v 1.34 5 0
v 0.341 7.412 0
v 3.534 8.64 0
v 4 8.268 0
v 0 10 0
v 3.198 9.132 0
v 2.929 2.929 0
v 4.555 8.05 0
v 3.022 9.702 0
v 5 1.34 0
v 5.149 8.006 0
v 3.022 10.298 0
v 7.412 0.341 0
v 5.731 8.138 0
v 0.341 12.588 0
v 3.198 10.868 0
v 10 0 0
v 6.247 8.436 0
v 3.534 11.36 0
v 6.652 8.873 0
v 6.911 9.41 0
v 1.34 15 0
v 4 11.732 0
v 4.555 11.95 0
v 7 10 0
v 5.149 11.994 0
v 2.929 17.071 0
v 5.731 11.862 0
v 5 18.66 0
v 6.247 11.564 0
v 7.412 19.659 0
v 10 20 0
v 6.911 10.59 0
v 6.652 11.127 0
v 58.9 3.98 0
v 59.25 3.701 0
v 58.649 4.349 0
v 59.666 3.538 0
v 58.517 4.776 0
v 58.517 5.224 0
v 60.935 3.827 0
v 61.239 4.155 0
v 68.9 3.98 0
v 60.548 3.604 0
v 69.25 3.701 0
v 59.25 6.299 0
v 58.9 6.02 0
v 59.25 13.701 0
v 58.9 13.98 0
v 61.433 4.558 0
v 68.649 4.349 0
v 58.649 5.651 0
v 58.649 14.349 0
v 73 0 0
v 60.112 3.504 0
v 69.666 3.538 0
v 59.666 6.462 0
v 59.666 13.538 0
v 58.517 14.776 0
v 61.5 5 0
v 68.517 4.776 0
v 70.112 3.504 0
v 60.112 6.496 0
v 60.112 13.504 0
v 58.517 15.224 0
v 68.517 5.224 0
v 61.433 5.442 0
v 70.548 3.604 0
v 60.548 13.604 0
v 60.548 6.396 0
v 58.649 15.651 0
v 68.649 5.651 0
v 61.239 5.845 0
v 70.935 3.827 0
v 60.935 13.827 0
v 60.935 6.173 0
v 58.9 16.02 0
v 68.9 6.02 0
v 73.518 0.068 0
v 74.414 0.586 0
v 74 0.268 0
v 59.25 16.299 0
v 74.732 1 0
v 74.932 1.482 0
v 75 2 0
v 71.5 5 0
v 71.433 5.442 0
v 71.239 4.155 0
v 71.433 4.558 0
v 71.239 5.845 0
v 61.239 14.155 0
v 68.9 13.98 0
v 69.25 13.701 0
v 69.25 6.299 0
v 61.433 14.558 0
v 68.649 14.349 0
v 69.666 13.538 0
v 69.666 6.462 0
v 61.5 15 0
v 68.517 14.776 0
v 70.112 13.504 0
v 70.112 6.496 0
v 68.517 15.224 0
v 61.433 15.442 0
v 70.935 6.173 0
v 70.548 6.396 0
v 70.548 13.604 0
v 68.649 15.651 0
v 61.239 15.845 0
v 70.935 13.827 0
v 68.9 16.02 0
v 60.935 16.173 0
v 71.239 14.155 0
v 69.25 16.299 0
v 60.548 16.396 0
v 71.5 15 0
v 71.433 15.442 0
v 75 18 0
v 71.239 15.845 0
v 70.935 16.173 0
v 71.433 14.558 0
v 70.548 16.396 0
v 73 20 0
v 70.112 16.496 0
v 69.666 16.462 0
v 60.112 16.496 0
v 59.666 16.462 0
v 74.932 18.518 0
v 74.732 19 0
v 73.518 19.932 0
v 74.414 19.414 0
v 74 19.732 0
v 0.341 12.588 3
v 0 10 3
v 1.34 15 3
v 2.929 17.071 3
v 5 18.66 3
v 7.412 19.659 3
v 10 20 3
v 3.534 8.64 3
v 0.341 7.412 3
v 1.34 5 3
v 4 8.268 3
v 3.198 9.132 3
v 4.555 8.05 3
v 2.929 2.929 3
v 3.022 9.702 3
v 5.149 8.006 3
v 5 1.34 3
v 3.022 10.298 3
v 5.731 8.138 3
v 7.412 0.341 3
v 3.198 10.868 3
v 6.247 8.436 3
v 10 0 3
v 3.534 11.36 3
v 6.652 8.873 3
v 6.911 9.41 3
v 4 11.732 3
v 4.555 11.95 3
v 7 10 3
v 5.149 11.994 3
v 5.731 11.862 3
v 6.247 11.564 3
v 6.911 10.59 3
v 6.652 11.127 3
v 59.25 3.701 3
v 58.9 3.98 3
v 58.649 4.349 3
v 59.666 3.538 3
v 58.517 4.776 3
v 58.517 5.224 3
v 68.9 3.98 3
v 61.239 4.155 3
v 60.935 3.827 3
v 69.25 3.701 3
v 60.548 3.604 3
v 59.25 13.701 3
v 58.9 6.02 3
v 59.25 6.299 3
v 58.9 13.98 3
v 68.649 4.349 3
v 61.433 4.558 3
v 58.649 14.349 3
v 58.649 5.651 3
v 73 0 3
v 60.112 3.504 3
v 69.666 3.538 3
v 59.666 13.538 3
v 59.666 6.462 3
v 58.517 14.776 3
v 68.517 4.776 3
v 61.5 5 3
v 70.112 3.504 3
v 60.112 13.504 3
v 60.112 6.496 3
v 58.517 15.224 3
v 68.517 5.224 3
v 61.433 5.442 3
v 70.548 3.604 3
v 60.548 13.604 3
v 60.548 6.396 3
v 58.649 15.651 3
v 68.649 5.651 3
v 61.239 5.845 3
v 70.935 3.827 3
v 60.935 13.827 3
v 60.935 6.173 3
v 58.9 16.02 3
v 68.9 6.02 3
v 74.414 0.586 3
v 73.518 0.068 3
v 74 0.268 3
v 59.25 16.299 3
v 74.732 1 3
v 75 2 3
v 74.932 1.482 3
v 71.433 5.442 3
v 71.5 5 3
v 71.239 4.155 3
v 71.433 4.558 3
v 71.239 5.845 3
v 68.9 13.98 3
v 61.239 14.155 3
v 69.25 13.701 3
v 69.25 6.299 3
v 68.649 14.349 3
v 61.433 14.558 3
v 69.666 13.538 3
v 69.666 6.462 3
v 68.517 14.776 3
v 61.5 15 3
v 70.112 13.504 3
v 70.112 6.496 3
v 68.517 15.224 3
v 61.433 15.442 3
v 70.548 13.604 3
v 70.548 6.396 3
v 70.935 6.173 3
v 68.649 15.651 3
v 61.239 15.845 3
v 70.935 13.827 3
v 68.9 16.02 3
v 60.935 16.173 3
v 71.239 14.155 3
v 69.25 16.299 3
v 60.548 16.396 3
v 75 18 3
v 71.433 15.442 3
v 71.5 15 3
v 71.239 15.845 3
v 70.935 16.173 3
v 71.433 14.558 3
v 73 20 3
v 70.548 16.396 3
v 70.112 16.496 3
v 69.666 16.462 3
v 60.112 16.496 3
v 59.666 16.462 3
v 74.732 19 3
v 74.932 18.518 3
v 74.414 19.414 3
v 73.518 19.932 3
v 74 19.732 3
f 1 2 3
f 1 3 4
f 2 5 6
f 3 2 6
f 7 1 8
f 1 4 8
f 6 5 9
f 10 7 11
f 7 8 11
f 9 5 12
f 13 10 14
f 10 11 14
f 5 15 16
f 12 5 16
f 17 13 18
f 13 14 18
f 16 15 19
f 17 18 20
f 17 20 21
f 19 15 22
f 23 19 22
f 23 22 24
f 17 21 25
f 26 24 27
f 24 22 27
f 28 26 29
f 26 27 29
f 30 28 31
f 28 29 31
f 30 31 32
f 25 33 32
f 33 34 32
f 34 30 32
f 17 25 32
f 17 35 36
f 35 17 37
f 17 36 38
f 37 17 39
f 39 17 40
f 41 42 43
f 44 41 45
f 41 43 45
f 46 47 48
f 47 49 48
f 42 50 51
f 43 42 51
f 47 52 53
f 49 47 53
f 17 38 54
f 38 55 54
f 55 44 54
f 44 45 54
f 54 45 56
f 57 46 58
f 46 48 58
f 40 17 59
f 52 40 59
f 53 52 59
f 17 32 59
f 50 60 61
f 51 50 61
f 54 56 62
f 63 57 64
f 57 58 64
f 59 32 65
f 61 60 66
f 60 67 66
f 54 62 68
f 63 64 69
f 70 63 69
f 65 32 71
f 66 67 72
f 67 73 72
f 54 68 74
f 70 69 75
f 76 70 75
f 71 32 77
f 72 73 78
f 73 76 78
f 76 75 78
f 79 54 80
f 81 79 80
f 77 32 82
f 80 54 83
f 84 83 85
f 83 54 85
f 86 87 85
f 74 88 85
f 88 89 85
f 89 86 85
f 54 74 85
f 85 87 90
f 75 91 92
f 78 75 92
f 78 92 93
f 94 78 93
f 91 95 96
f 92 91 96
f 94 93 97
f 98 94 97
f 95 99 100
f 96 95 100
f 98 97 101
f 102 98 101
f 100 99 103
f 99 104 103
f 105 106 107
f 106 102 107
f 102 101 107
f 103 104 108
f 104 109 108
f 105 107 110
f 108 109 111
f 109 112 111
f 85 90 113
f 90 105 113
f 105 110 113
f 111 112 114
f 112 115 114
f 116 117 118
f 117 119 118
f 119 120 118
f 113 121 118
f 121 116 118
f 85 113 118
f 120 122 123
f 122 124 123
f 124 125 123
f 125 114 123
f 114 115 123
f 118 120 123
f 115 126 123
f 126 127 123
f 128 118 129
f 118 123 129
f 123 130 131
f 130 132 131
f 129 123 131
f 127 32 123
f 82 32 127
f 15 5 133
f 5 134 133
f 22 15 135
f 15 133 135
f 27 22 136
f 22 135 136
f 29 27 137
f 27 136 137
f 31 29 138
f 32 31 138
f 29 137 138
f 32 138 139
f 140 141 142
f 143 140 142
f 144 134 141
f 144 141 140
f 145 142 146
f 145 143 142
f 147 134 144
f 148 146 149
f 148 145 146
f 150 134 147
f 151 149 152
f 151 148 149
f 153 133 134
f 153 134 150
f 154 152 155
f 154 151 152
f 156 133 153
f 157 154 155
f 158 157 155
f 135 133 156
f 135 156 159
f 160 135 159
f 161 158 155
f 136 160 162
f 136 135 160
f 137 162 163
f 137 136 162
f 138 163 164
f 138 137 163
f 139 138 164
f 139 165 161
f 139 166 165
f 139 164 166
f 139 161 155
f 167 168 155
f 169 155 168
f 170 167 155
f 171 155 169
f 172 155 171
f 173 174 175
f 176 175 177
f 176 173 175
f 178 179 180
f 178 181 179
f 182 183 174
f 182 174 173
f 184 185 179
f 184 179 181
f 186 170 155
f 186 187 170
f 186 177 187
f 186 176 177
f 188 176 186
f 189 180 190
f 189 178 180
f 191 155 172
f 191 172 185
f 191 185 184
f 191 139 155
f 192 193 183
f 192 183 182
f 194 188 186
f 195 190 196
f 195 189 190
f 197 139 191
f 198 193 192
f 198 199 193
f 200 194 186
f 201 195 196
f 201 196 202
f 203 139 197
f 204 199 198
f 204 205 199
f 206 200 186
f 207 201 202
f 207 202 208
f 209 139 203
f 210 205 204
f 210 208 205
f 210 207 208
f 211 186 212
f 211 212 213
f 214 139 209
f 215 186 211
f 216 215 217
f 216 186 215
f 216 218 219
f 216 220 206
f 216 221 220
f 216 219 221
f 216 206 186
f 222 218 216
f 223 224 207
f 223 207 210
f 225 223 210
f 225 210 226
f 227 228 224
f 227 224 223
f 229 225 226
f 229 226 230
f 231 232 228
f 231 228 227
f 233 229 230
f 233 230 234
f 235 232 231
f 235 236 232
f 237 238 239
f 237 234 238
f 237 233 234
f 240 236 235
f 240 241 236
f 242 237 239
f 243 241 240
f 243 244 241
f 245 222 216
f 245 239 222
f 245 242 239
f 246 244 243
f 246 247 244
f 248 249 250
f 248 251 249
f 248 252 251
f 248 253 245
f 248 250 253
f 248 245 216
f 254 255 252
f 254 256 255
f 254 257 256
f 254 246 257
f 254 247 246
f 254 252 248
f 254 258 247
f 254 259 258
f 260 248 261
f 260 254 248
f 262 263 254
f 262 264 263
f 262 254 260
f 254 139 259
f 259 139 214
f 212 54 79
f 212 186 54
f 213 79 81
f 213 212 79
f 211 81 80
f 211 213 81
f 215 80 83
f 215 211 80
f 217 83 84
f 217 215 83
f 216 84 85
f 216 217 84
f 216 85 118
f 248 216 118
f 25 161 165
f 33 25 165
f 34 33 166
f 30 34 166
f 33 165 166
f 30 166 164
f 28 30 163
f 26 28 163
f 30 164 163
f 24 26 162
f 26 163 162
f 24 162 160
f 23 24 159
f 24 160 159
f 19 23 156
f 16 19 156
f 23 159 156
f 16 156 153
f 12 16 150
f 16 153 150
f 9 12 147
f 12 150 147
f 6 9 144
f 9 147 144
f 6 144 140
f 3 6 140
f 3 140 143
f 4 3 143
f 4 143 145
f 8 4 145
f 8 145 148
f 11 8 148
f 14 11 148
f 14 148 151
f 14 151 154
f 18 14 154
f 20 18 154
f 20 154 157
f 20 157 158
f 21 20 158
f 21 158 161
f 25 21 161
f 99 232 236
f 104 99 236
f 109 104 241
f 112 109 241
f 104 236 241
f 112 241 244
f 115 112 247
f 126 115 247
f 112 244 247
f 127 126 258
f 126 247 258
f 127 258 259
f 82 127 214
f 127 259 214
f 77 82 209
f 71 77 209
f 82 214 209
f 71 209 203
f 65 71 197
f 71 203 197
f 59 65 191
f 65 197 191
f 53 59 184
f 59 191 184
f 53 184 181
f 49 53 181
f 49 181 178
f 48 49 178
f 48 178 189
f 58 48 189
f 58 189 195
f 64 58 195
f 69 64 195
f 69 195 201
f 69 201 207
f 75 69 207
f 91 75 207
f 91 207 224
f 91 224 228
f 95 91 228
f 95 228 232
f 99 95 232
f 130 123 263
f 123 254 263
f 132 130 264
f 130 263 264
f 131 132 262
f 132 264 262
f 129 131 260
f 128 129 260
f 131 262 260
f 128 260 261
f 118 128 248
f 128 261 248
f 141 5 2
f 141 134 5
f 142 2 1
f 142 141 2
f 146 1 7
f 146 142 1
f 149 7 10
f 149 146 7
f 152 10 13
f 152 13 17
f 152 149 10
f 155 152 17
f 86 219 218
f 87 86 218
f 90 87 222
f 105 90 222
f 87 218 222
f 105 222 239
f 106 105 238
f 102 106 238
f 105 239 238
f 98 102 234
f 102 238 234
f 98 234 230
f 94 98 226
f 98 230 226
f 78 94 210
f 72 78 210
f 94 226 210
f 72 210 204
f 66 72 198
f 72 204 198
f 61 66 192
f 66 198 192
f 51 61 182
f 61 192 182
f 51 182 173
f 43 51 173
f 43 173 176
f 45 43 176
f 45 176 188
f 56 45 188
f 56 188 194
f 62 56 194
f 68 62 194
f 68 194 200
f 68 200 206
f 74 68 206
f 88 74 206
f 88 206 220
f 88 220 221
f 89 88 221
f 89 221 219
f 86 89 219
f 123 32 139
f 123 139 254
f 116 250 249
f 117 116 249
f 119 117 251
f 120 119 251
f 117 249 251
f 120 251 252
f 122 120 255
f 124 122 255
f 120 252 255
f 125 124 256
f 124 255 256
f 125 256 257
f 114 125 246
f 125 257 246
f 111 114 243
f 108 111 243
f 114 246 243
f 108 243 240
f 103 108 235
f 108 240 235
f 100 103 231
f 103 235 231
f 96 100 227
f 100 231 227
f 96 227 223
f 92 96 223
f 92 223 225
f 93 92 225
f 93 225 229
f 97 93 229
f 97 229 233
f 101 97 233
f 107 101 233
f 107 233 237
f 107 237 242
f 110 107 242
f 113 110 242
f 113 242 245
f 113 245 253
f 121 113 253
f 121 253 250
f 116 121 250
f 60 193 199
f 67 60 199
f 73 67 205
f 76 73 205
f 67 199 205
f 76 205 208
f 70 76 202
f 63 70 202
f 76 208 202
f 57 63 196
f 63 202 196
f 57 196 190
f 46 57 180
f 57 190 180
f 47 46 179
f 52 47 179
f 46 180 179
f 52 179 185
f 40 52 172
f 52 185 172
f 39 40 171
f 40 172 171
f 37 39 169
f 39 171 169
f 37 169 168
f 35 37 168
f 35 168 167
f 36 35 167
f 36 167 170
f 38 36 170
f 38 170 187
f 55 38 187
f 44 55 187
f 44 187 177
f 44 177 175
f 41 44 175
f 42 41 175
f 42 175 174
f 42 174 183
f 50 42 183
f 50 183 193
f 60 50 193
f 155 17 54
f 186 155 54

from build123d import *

# Parameters (mm, degrees)
SKETCH_1_W          = 75
SKETCH_1_H          = 20
EXTRUDE_1_DEPTH     = 3
SKETCH_2_R          = 1.5
SKETCH_2_R_2        = 2
CUT_EXTRUDE_1_DEPTH = 4
FILLET_1_R          = 10
FILLET_2_R          = 2


with BuildPart() as part:
    # 草图1 → 凸台-拉伸1 (new body)
    with BuildSketch(Plane.XY):
        with Locations((37.5, 10)):
            Rectangle(SKETCH_1_W, SKETCH_1_H)
    extrude(amount=EXTRUDE_1_DEPTH)

    # 草图2 → 切除-拉伸1 (cut)
    with BuildSketch(Plane.XY.offset(3)):
        with Locations((70, 15)):
            Circle(SKETCH_2_R)
        with Locations((70, 5)):
            Circle(SKETCH_2_R)
        with Locations((60, 15)):
            Circle(SKETCH_2_R)
        with Locations((60, 5)):
            Circle(SKETCH_2_R)
        with Locations((5, 10)):
            Circle(SKETCH_2_R_2)
    extrude(amount=-CUT_EXTRUDE_1_DEPTH, mode=Mode.SUBTRACT)

    # 圆角1
    fillet_1_edges = [part.edges().sort_by_distance(p)[0] for p in [
        (0, 0, 1.5),
        (0, 20, 1.5),
    ]]
    fillet(fillet_1_edges, radius=FILLET_1_R - 0.0001)  # a hair under: the kernel refuses the full size

    # 圆角2
    fillet_2_edges = [part.edges().sort_by_distance(p)[0] for p in [
        (75, 20, 1.5),
        (75, 0, 1.5),
    ]]
    fillet(fillet_2_edges, radius=FILLET_2_R)


solid = part.part
